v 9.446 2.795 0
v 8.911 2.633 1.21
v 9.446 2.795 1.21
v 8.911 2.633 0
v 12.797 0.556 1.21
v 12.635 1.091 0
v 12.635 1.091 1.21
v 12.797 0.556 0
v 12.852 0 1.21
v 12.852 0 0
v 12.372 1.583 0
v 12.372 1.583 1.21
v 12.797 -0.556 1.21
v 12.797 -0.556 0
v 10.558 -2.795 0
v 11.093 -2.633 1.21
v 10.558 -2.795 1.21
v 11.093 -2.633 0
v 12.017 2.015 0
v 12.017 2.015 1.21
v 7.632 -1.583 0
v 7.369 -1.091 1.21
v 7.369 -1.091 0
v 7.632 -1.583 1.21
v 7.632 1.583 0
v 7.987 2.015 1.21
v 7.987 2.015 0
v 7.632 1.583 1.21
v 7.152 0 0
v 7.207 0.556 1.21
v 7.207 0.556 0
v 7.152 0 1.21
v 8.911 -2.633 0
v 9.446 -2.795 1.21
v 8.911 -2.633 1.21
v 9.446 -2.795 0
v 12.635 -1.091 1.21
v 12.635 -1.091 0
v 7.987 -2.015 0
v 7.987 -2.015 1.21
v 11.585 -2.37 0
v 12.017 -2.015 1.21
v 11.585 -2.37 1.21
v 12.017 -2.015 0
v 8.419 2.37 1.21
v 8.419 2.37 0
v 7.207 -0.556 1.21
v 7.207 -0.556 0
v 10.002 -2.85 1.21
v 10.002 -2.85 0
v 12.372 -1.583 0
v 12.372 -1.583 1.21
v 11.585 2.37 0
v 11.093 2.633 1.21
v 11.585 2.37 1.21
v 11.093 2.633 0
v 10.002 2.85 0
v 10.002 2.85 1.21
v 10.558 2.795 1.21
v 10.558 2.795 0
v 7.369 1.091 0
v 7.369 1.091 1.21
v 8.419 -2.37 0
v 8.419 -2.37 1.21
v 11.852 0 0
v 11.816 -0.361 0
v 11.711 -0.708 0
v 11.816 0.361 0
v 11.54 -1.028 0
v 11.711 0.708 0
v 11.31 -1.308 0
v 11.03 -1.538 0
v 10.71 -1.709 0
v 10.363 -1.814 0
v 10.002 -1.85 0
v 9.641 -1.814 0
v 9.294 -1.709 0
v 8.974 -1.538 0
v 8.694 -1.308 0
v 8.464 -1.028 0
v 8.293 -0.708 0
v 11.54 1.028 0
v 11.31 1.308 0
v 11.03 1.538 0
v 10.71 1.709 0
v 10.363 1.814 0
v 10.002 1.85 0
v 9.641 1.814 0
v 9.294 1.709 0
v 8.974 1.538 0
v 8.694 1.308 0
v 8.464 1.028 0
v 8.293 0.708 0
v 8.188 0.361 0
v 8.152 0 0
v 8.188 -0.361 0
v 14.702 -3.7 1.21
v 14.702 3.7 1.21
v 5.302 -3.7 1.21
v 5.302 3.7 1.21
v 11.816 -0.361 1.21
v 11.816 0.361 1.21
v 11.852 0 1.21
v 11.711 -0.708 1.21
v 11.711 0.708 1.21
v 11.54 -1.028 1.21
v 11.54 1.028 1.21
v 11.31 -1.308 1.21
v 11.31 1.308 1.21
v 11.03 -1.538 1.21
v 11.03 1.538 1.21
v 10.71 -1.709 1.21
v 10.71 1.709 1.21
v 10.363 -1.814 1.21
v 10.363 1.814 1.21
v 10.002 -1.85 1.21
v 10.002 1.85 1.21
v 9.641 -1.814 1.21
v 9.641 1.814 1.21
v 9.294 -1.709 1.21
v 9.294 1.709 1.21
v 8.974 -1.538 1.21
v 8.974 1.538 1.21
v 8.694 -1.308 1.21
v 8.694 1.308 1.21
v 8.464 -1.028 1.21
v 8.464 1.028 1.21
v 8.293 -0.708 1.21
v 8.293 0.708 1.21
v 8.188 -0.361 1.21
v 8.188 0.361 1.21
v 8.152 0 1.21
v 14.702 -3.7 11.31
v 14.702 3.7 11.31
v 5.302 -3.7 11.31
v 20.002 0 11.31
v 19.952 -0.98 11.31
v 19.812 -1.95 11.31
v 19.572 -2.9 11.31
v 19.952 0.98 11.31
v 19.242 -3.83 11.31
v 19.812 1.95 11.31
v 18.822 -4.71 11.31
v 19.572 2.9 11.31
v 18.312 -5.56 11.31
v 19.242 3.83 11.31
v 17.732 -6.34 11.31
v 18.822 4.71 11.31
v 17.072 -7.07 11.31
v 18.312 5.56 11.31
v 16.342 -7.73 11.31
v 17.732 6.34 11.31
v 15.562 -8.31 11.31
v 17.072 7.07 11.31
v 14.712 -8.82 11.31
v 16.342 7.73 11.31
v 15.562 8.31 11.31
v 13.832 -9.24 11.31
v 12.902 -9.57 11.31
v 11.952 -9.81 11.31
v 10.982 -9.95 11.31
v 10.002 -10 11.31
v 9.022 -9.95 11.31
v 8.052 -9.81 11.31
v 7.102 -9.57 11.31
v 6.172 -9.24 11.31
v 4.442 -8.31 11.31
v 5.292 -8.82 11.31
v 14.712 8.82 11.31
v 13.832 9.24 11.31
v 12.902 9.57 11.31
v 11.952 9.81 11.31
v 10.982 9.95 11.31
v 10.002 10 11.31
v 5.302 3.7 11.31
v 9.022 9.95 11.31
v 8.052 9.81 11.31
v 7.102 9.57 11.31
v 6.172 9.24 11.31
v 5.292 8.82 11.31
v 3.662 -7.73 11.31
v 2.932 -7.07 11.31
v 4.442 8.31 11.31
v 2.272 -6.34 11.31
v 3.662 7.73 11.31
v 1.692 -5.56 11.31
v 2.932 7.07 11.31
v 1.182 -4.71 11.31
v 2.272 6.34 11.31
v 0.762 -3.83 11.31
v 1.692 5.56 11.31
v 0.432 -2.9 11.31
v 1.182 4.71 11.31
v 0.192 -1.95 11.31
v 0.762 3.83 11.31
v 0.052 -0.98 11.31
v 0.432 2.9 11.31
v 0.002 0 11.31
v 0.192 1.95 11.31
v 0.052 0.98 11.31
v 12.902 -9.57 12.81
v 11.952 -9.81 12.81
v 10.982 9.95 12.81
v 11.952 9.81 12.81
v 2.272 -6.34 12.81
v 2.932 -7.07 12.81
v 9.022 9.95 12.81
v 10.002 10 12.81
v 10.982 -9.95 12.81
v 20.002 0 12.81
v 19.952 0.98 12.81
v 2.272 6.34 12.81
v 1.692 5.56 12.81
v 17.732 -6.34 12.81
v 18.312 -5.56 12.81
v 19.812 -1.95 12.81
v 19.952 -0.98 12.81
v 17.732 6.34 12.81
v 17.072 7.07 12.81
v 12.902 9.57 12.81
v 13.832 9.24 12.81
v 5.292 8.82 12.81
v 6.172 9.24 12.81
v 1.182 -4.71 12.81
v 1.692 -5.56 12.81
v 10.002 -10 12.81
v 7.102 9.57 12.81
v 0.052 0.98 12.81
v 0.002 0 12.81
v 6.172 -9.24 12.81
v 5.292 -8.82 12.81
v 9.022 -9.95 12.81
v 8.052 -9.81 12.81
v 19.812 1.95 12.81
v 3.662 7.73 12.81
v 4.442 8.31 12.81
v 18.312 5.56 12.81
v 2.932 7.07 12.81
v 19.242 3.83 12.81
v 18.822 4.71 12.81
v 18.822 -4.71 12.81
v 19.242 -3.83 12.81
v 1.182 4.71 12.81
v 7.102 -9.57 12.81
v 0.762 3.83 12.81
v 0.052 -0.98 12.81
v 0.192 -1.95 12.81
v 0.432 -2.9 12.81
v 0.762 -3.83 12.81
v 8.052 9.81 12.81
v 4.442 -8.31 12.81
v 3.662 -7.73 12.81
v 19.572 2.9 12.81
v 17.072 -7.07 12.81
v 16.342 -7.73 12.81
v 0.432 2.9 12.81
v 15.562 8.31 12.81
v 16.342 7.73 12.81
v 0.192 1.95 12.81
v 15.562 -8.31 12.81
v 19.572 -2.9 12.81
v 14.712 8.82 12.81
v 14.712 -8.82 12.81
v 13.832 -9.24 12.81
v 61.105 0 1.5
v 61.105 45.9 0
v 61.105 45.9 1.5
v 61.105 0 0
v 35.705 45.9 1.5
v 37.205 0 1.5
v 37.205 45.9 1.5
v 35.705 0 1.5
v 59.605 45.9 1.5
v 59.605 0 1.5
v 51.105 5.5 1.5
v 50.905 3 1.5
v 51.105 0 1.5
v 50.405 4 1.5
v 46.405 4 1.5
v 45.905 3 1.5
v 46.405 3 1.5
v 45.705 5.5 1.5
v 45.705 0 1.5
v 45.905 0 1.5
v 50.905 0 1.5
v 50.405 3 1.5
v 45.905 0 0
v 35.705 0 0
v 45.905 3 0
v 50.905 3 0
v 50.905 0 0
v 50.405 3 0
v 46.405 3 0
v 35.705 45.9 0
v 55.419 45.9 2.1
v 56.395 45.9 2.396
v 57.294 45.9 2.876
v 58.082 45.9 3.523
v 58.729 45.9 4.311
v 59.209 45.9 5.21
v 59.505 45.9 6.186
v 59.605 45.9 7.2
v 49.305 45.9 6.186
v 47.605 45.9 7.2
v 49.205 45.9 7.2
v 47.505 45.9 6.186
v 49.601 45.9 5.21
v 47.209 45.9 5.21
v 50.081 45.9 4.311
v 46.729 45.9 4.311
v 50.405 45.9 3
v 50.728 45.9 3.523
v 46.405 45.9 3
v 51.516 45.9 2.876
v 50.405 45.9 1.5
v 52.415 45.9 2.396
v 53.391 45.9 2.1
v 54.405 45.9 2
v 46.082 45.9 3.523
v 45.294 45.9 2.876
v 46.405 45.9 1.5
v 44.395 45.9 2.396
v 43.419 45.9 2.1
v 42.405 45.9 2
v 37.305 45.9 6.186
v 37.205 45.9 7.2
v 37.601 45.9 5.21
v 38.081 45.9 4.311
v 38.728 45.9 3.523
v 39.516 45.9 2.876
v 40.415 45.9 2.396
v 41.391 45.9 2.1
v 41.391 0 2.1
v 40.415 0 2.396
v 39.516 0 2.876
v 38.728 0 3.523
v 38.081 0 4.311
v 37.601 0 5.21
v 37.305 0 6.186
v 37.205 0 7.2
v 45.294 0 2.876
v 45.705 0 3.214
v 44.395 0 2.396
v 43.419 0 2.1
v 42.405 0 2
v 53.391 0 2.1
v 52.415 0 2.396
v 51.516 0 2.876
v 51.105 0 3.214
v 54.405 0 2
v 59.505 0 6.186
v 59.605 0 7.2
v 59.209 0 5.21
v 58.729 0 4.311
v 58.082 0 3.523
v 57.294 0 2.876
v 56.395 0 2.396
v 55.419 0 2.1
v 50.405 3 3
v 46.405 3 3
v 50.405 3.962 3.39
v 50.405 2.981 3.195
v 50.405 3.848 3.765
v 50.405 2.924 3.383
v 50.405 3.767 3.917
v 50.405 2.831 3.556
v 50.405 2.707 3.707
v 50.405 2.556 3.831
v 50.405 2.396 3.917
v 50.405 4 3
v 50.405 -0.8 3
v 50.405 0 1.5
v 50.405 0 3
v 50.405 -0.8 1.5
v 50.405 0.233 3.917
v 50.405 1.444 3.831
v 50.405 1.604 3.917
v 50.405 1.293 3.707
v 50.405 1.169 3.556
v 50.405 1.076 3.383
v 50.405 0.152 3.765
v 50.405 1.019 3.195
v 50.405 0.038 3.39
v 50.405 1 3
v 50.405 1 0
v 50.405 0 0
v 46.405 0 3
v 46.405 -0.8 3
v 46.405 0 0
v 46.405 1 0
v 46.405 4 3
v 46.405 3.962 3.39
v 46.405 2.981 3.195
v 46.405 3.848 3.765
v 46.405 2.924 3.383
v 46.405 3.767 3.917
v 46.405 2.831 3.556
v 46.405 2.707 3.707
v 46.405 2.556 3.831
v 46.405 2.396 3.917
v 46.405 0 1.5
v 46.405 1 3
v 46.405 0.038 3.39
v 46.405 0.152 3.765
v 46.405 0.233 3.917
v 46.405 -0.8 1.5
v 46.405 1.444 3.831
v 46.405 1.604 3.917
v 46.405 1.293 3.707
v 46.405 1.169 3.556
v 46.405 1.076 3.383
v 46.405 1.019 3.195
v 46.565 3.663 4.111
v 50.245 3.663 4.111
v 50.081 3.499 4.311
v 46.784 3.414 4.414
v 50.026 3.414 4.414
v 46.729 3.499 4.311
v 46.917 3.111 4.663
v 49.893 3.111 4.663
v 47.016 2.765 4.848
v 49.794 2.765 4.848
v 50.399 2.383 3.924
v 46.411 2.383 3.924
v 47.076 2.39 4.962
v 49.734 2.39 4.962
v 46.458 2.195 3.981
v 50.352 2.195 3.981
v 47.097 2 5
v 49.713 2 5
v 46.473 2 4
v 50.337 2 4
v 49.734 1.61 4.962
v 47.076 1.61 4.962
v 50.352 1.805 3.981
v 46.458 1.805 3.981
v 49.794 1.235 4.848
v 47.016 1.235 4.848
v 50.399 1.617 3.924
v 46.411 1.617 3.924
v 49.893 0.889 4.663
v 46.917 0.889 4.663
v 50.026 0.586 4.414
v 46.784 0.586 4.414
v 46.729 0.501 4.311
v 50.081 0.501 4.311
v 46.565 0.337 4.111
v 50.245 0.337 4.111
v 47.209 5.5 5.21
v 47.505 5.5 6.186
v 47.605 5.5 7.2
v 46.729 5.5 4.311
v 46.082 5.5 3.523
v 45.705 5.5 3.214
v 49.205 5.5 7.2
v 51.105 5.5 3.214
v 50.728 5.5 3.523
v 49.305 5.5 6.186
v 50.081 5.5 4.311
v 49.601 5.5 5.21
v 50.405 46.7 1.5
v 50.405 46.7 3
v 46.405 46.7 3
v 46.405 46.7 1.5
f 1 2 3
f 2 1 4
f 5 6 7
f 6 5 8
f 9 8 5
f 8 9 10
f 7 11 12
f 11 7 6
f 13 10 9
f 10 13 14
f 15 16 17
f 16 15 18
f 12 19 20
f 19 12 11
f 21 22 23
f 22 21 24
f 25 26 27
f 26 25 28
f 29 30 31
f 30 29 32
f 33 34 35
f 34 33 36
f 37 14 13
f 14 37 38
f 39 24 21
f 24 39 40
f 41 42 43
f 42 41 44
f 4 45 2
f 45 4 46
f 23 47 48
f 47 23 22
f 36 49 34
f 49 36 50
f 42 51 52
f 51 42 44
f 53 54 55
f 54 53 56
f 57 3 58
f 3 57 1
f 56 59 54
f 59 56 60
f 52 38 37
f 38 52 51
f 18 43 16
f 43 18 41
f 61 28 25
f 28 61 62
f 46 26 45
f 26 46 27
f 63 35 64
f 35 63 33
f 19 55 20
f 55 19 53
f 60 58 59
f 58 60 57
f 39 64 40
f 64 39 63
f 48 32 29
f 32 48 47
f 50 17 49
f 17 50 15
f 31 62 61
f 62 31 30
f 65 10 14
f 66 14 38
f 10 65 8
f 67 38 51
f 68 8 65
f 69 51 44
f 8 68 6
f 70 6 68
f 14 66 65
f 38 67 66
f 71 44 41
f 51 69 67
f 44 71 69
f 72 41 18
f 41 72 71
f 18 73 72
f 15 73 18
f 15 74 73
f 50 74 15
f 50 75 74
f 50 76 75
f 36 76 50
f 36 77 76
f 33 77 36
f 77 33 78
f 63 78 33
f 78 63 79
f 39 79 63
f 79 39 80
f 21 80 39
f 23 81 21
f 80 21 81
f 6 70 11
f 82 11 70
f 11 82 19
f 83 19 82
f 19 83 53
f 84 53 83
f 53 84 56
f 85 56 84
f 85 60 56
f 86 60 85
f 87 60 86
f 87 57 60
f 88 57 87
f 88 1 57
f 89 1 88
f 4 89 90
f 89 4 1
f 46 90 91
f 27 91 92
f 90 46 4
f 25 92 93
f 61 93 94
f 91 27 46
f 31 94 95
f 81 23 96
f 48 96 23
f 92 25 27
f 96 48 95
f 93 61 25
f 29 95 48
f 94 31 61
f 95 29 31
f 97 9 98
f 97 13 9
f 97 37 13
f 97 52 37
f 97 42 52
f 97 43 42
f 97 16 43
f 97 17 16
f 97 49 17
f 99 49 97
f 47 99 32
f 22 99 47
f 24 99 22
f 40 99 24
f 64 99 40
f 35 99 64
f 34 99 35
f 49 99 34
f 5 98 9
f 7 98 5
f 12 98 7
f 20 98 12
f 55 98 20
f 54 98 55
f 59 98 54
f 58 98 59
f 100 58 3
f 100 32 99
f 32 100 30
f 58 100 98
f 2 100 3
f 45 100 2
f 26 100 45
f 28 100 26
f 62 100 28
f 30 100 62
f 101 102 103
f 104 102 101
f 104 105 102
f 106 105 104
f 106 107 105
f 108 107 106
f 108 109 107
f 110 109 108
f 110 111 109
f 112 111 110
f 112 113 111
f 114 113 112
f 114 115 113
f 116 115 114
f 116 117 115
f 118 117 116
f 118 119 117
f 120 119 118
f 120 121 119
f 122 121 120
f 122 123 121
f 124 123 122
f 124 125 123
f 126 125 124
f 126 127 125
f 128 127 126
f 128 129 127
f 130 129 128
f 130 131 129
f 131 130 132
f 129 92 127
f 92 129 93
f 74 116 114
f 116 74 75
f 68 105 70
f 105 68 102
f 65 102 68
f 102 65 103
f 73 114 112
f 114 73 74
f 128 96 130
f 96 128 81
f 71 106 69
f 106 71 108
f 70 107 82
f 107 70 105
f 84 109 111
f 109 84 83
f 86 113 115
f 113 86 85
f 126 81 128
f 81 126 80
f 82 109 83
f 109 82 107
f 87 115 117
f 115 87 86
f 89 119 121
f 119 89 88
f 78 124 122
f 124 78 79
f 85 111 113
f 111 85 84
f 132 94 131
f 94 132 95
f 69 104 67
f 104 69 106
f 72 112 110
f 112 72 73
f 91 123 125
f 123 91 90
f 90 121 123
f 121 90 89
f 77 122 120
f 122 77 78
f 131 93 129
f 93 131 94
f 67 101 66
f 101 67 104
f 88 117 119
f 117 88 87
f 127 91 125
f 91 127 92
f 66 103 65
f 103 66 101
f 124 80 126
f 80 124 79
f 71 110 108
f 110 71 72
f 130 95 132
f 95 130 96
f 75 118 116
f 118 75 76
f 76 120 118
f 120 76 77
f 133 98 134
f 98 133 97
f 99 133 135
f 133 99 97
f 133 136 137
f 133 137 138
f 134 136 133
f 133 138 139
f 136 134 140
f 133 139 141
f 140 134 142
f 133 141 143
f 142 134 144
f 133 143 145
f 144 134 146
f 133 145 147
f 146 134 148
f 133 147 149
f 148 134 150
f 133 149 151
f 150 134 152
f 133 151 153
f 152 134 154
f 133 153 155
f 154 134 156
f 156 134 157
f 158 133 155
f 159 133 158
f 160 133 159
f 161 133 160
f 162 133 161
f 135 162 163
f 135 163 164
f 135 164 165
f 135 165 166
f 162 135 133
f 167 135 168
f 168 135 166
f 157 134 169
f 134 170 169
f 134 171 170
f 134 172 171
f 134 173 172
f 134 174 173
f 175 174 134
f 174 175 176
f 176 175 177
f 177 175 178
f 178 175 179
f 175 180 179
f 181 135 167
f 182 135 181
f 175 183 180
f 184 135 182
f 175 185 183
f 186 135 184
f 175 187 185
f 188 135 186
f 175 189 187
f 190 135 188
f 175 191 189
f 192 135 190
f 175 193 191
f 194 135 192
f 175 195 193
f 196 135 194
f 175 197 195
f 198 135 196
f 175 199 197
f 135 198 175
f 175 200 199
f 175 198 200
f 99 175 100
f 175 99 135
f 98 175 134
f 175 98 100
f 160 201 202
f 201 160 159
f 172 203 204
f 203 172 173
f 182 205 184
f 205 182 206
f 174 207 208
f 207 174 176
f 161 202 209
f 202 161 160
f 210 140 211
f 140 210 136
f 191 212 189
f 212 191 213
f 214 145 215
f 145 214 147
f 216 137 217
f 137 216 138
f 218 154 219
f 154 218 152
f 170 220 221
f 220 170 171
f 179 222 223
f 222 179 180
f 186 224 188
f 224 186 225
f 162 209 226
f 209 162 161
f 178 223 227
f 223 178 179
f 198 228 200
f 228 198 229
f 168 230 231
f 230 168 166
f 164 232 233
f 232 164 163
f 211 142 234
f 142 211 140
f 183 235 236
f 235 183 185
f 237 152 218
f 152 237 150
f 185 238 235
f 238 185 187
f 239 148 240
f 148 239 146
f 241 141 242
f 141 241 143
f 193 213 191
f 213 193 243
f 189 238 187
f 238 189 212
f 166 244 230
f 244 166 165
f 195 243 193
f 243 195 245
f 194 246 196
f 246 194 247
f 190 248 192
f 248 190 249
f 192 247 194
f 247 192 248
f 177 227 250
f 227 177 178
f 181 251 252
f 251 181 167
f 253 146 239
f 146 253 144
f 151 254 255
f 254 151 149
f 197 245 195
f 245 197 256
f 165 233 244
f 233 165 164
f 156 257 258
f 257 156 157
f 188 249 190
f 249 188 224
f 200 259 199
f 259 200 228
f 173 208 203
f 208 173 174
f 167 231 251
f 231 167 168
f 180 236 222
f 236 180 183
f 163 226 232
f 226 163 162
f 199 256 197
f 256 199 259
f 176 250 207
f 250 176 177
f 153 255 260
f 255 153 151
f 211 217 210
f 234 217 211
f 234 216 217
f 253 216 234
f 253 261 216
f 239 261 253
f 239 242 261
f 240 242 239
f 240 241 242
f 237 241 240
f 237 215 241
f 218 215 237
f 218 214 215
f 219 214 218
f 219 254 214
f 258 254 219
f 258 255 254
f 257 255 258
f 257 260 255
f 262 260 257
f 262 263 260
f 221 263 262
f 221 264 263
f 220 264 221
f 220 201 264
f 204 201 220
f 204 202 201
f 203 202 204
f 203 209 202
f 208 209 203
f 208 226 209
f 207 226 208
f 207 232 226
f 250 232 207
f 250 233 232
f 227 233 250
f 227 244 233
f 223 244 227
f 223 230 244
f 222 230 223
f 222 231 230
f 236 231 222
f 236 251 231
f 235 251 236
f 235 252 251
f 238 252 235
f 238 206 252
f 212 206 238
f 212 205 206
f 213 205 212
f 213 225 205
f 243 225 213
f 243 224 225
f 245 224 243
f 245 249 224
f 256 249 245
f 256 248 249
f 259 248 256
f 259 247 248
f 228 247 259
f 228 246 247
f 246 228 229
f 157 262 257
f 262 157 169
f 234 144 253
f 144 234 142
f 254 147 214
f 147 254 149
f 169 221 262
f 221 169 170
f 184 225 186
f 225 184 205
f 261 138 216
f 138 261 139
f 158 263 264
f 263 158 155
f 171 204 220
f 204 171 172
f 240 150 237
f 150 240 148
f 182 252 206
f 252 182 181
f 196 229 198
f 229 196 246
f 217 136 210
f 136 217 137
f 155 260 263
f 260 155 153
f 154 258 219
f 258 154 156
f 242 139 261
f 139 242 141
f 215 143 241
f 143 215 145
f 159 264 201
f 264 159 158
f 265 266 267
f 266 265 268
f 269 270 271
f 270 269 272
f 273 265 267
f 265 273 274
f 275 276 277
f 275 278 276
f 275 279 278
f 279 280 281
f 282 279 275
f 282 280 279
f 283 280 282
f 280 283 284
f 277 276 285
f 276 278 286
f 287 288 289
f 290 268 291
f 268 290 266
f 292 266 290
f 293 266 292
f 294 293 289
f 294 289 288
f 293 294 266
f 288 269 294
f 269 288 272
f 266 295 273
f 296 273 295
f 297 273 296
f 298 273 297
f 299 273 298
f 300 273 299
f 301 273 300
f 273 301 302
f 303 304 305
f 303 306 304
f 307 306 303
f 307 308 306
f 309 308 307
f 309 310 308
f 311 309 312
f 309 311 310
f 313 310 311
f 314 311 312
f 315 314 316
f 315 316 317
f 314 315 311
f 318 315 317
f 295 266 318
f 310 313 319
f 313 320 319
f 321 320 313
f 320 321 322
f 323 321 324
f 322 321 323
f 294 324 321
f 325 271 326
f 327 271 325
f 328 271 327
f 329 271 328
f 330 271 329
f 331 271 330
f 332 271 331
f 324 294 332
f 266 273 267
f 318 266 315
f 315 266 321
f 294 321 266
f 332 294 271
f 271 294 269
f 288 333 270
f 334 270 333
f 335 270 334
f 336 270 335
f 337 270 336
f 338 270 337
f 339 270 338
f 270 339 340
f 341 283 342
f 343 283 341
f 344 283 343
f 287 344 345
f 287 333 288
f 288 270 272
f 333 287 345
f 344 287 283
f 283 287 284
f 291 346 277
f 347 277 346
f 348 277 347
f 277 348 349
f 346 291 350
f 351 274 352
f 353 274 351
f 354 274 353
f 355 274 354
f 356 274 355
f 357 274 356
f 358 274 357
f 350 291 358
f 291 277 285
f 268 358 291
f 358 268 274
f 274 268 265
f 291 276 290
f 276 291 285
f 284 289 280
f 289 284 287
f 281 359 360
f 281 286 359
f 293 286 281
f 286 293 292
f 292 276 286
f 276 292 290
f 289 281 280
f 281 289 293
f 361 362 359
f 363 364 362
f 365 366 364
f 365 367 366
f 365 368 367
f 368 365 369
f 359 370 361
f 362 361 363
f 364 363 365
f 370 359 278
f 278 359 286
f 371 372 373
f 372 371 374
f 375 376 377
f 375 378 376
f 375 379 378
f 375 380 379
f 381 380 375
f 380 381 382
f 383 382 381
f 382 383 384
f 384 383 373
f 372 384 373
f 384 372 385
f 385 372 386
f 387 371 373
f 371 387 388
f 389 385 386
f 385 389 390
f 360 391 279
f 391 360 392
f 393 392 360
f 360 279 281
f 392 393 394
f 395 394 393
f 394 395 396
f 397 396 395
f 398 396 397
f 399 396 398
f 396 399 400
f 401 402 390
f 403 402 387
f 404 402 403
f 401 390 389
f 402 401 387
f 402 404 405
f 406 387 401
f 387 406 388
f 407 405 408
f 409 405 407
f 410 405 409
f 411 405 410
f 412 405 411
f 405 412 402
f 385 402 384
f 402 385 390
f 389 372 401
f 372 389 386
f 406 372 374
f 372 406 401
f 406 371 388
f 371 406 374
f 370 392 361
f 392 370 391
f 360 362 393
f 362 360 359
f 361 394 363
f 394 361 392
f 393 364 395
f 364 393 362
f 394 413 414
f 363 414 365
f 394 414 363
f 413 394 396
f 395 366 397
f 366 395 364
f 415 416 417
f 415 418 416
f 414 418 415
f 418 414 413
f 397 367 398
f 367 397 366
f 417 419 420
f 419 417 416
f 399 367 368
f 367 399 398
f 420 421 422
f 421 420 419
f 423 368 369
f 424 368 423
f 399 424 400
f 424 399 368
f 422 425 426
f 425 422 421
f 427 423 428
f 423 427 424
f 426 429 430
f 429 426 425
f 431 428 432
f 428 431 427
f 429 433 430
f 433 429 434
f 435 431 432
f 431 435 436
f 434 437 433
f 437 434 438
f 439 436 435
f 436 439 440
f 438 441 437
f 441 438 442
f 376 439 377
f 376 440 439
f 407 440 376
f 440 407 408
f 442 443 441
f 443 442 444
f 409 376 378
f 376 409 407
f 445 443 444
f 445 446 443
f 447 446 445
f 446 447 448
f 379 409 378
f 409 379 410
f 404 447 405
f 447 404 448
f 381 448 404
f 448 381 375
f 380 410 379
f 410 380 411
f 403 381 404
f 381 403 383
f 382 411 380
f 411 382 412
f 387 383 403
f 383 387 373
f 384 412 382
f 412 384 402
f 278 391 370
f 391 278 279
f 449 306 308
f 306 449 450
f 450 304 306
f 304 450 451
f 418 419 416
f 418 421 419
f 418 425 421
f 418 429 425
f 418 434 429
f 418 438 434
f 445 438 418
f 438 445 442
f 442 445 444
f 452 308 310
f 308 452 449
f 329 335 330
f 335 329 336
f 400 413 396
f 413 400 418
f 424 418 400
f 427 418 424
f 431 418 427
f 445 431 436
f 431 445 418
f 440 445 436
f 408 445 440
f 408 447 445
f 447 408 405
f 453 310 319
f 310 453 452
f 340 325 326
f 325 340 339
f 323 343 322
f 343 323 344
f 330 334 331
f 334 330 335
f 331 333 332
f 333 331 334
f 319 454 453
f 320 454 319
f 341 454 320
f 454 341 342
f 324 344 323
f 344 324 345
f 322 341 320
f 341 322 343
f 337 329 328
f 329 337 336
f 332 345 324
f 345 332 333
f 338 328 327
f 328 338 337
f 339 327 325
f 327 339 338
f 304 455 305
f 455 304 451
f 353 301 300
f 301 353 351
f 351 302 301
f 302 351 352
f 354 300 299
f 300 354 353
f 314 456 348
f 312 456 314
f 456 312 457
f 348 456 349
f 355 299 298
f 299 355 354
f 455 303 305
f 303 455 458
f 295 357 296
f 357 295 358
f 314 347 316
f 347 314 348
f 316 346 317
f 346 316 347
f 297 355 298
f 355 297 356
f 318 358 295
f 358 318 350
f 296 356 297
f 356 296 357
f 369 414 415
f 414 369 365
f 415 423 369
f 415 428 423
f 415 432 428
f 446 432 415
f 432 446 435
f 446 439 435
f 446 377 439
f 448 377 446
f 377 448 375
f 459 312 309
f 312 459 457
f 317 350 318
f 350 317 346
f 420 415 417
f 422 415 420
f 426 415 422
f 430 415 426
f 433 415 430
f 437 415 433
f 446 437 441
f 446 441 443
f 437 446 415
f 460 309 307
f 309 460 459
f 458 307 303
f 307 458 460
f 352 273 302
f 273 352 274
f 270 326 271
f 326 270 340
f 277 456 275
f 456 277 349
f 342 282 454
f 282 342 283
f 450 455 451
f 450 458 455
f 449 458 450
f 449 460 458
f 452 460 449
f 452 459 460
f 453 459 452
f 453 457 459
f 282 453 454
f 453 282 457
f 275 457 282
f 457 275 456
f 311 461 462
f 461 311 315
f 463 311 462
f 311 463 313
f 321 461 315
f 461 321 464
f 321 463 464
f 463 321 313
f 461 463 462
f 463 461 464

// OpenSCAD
// ============================================================
// Extra parts — separate build plate
// ============================================================

hatch_w = 25.400;
hatch_l = 45.900;
hatch_t = 1.500;
loop_w = 4.000;
loop_h = 3.000;
loop_t = 1.000;
tab_d = 0.800;
tab_h = 1.500;
slit_w = 5.000;
arm_gap = 2.000;
bend_r = 1.500;

module spring_latch() {
  cube([loop_w, loop_t, loop_h]);
  translate([0, -tab_d, hatch_t])
    cube([loop_w, tab_d + loop_t, tab_h]);
  translate([loop_w/2, loop_t + arm_gap/2, loop_h])
    rotate([90, 0, 90])
      rotate_extrude(angle=180, $fn=32)
        translate([bend_r, 0, 0])
          square([loop_t, loop_w], center=true);
  translate([0, loop_t + arm_gap, 0])
    cube([loop_w, loop_t, loop_h]);
}

// button
translate([10.002, 0, 0]) {
  // Custom button: btn_power
  // Socket (snaps onto switch cylinder Ø3.40mm)
  difference() {
    cylinder(h = 1.210, r = 2.850, $fn = 32);
    cylinder(h = 1.210, r = 1.850, $fn = 32);
  }
  // Stem (passes through cavity + ceiling)
  translate([0, 0, 1.210])
    linear_extrude(height = 10.100)
      polygon(points = [[-4.700, -3.700], [-4.700, 3.700], [4.700, 3.700], [4.700, -3.700]]);
  // Cap
  translate([0, 0, 11.310])
    linear_extrude(height = 1.500)
      polygon(points = [[10.000, 0.000], [9.950, -0.980], [9.810, -1.950], [9.570, -2.900], [9.240, -3.830], [8.820, -4.710], [8.310, -5.560], [7.730, -6.340], [7.070, -7.070], [6.340, -7.730], [5.560, -8.310], [4.710, -8.820], [3.830, -9.240], [2.900, -9.570], [1.950, -9.810], [0.980, -9.950], [0.000, -10.000], [-0.980, -9.950], [-1.950, -9.810], [-2.900, -9.570], [-3.830, -9.240], [-4.710, -8.820], [-5.560, -8.310], [-6.340, -7.730], [-7.070, -7.070], [-7.730, -6.340], [-8.310, -5.560], [-8.820, -4.710], [-9.240, -3.830], [-9.570, -2.900], [-9.810, -1.950], [-9.950, -0.980], [-10.000, 0.000], [-9.950, 0.980], [-9.810, 1.950], [-9.570, 2.900], [-9.240, 3.830], [-8.820, 4.710], [-8.310, 5.560], [-7.730, 6.340], [-7.070, 7.070], [-6.340, 7.730], [-5.560, 8.310], [-4.710, 8.820], [-3.830, 9.240], [-2.900, 9.570], [-1.950, 9.810], [-0.980, 9.950], [0.000, 10.000], [0.980, 9.950], [1.950, 9.810], [2.900, 9.570], [3.830, 9.240], [4.710, 8.820], [5.560, 8.310], [6.340, 7.730], [7.070, 7.070], [7.730, 6.340], [8.310, 5.560], [8.820, 4.710], [9.240, 3.830], [9.570, 2.900], [9.810, 1.950], [9.950, 0.980]]);
}

// battery hatch
translate([35.705, 0, 0]) {
  difference() {
    cube([hatch_w, hatch_l, hatch_t]);
    translate([(hatch_w - slit_w) / 2, 0, -1])
      cube([slit_w, 3.000, hatch_t + 2]);
  }
  
  difference() {
    translate([(hatch_w - loop_w) / 2, 0, 0])
      spring_latch();
    intersection() {
      translate([6.700, -1, 7.200])
        rotate([-90, 0, 0])
          cylinder(h = 47.900, r = 5.200, $fn = 32);
      translate([1.500, -1, 0])
        cube([10.400, 47.900, 7.200]);
    }
    intersection() {
      translate([18.700, -1, 7.200])
        rotate([-90, 0, 0])
          cylinder(h = 47.900, r = 5.200, $fn = 32);
      translate([13.500, -1, 0])
        cube([10.400, 47.900, 7.200]);
    }
  }
  
  translate([10.700, hatch_l, hatch_t])
    cube([4.000, tab_d, tab_h]);
  
  difference() {
    translate([1.500, 0, 1.500])
      cube([22.400, 45.900, 5.700]);
    translate([10.000, -1, 0])
      cube([5.400, 6.500, 8.200]);
    intersection() {
      translate([6.700, -1, 7.200])
        rotate([-90, 0, 0])
          cylinder(h = 47.900, r = 5.200, $fn = 32);
      translate([1.500, -1, 0])
        cube([10.400, 47.900, 7.200]);
    }
    intersection() {
      translate([18.700, -1, 7.200])
        rotate([-90, 0, 0])
          cylinder(h = 47.900, r = 5.200, $fn = 32);
      translate([13.500, -1, 0])
        cube([10.400, 47.900, 7.200]);
    }
  }
}
